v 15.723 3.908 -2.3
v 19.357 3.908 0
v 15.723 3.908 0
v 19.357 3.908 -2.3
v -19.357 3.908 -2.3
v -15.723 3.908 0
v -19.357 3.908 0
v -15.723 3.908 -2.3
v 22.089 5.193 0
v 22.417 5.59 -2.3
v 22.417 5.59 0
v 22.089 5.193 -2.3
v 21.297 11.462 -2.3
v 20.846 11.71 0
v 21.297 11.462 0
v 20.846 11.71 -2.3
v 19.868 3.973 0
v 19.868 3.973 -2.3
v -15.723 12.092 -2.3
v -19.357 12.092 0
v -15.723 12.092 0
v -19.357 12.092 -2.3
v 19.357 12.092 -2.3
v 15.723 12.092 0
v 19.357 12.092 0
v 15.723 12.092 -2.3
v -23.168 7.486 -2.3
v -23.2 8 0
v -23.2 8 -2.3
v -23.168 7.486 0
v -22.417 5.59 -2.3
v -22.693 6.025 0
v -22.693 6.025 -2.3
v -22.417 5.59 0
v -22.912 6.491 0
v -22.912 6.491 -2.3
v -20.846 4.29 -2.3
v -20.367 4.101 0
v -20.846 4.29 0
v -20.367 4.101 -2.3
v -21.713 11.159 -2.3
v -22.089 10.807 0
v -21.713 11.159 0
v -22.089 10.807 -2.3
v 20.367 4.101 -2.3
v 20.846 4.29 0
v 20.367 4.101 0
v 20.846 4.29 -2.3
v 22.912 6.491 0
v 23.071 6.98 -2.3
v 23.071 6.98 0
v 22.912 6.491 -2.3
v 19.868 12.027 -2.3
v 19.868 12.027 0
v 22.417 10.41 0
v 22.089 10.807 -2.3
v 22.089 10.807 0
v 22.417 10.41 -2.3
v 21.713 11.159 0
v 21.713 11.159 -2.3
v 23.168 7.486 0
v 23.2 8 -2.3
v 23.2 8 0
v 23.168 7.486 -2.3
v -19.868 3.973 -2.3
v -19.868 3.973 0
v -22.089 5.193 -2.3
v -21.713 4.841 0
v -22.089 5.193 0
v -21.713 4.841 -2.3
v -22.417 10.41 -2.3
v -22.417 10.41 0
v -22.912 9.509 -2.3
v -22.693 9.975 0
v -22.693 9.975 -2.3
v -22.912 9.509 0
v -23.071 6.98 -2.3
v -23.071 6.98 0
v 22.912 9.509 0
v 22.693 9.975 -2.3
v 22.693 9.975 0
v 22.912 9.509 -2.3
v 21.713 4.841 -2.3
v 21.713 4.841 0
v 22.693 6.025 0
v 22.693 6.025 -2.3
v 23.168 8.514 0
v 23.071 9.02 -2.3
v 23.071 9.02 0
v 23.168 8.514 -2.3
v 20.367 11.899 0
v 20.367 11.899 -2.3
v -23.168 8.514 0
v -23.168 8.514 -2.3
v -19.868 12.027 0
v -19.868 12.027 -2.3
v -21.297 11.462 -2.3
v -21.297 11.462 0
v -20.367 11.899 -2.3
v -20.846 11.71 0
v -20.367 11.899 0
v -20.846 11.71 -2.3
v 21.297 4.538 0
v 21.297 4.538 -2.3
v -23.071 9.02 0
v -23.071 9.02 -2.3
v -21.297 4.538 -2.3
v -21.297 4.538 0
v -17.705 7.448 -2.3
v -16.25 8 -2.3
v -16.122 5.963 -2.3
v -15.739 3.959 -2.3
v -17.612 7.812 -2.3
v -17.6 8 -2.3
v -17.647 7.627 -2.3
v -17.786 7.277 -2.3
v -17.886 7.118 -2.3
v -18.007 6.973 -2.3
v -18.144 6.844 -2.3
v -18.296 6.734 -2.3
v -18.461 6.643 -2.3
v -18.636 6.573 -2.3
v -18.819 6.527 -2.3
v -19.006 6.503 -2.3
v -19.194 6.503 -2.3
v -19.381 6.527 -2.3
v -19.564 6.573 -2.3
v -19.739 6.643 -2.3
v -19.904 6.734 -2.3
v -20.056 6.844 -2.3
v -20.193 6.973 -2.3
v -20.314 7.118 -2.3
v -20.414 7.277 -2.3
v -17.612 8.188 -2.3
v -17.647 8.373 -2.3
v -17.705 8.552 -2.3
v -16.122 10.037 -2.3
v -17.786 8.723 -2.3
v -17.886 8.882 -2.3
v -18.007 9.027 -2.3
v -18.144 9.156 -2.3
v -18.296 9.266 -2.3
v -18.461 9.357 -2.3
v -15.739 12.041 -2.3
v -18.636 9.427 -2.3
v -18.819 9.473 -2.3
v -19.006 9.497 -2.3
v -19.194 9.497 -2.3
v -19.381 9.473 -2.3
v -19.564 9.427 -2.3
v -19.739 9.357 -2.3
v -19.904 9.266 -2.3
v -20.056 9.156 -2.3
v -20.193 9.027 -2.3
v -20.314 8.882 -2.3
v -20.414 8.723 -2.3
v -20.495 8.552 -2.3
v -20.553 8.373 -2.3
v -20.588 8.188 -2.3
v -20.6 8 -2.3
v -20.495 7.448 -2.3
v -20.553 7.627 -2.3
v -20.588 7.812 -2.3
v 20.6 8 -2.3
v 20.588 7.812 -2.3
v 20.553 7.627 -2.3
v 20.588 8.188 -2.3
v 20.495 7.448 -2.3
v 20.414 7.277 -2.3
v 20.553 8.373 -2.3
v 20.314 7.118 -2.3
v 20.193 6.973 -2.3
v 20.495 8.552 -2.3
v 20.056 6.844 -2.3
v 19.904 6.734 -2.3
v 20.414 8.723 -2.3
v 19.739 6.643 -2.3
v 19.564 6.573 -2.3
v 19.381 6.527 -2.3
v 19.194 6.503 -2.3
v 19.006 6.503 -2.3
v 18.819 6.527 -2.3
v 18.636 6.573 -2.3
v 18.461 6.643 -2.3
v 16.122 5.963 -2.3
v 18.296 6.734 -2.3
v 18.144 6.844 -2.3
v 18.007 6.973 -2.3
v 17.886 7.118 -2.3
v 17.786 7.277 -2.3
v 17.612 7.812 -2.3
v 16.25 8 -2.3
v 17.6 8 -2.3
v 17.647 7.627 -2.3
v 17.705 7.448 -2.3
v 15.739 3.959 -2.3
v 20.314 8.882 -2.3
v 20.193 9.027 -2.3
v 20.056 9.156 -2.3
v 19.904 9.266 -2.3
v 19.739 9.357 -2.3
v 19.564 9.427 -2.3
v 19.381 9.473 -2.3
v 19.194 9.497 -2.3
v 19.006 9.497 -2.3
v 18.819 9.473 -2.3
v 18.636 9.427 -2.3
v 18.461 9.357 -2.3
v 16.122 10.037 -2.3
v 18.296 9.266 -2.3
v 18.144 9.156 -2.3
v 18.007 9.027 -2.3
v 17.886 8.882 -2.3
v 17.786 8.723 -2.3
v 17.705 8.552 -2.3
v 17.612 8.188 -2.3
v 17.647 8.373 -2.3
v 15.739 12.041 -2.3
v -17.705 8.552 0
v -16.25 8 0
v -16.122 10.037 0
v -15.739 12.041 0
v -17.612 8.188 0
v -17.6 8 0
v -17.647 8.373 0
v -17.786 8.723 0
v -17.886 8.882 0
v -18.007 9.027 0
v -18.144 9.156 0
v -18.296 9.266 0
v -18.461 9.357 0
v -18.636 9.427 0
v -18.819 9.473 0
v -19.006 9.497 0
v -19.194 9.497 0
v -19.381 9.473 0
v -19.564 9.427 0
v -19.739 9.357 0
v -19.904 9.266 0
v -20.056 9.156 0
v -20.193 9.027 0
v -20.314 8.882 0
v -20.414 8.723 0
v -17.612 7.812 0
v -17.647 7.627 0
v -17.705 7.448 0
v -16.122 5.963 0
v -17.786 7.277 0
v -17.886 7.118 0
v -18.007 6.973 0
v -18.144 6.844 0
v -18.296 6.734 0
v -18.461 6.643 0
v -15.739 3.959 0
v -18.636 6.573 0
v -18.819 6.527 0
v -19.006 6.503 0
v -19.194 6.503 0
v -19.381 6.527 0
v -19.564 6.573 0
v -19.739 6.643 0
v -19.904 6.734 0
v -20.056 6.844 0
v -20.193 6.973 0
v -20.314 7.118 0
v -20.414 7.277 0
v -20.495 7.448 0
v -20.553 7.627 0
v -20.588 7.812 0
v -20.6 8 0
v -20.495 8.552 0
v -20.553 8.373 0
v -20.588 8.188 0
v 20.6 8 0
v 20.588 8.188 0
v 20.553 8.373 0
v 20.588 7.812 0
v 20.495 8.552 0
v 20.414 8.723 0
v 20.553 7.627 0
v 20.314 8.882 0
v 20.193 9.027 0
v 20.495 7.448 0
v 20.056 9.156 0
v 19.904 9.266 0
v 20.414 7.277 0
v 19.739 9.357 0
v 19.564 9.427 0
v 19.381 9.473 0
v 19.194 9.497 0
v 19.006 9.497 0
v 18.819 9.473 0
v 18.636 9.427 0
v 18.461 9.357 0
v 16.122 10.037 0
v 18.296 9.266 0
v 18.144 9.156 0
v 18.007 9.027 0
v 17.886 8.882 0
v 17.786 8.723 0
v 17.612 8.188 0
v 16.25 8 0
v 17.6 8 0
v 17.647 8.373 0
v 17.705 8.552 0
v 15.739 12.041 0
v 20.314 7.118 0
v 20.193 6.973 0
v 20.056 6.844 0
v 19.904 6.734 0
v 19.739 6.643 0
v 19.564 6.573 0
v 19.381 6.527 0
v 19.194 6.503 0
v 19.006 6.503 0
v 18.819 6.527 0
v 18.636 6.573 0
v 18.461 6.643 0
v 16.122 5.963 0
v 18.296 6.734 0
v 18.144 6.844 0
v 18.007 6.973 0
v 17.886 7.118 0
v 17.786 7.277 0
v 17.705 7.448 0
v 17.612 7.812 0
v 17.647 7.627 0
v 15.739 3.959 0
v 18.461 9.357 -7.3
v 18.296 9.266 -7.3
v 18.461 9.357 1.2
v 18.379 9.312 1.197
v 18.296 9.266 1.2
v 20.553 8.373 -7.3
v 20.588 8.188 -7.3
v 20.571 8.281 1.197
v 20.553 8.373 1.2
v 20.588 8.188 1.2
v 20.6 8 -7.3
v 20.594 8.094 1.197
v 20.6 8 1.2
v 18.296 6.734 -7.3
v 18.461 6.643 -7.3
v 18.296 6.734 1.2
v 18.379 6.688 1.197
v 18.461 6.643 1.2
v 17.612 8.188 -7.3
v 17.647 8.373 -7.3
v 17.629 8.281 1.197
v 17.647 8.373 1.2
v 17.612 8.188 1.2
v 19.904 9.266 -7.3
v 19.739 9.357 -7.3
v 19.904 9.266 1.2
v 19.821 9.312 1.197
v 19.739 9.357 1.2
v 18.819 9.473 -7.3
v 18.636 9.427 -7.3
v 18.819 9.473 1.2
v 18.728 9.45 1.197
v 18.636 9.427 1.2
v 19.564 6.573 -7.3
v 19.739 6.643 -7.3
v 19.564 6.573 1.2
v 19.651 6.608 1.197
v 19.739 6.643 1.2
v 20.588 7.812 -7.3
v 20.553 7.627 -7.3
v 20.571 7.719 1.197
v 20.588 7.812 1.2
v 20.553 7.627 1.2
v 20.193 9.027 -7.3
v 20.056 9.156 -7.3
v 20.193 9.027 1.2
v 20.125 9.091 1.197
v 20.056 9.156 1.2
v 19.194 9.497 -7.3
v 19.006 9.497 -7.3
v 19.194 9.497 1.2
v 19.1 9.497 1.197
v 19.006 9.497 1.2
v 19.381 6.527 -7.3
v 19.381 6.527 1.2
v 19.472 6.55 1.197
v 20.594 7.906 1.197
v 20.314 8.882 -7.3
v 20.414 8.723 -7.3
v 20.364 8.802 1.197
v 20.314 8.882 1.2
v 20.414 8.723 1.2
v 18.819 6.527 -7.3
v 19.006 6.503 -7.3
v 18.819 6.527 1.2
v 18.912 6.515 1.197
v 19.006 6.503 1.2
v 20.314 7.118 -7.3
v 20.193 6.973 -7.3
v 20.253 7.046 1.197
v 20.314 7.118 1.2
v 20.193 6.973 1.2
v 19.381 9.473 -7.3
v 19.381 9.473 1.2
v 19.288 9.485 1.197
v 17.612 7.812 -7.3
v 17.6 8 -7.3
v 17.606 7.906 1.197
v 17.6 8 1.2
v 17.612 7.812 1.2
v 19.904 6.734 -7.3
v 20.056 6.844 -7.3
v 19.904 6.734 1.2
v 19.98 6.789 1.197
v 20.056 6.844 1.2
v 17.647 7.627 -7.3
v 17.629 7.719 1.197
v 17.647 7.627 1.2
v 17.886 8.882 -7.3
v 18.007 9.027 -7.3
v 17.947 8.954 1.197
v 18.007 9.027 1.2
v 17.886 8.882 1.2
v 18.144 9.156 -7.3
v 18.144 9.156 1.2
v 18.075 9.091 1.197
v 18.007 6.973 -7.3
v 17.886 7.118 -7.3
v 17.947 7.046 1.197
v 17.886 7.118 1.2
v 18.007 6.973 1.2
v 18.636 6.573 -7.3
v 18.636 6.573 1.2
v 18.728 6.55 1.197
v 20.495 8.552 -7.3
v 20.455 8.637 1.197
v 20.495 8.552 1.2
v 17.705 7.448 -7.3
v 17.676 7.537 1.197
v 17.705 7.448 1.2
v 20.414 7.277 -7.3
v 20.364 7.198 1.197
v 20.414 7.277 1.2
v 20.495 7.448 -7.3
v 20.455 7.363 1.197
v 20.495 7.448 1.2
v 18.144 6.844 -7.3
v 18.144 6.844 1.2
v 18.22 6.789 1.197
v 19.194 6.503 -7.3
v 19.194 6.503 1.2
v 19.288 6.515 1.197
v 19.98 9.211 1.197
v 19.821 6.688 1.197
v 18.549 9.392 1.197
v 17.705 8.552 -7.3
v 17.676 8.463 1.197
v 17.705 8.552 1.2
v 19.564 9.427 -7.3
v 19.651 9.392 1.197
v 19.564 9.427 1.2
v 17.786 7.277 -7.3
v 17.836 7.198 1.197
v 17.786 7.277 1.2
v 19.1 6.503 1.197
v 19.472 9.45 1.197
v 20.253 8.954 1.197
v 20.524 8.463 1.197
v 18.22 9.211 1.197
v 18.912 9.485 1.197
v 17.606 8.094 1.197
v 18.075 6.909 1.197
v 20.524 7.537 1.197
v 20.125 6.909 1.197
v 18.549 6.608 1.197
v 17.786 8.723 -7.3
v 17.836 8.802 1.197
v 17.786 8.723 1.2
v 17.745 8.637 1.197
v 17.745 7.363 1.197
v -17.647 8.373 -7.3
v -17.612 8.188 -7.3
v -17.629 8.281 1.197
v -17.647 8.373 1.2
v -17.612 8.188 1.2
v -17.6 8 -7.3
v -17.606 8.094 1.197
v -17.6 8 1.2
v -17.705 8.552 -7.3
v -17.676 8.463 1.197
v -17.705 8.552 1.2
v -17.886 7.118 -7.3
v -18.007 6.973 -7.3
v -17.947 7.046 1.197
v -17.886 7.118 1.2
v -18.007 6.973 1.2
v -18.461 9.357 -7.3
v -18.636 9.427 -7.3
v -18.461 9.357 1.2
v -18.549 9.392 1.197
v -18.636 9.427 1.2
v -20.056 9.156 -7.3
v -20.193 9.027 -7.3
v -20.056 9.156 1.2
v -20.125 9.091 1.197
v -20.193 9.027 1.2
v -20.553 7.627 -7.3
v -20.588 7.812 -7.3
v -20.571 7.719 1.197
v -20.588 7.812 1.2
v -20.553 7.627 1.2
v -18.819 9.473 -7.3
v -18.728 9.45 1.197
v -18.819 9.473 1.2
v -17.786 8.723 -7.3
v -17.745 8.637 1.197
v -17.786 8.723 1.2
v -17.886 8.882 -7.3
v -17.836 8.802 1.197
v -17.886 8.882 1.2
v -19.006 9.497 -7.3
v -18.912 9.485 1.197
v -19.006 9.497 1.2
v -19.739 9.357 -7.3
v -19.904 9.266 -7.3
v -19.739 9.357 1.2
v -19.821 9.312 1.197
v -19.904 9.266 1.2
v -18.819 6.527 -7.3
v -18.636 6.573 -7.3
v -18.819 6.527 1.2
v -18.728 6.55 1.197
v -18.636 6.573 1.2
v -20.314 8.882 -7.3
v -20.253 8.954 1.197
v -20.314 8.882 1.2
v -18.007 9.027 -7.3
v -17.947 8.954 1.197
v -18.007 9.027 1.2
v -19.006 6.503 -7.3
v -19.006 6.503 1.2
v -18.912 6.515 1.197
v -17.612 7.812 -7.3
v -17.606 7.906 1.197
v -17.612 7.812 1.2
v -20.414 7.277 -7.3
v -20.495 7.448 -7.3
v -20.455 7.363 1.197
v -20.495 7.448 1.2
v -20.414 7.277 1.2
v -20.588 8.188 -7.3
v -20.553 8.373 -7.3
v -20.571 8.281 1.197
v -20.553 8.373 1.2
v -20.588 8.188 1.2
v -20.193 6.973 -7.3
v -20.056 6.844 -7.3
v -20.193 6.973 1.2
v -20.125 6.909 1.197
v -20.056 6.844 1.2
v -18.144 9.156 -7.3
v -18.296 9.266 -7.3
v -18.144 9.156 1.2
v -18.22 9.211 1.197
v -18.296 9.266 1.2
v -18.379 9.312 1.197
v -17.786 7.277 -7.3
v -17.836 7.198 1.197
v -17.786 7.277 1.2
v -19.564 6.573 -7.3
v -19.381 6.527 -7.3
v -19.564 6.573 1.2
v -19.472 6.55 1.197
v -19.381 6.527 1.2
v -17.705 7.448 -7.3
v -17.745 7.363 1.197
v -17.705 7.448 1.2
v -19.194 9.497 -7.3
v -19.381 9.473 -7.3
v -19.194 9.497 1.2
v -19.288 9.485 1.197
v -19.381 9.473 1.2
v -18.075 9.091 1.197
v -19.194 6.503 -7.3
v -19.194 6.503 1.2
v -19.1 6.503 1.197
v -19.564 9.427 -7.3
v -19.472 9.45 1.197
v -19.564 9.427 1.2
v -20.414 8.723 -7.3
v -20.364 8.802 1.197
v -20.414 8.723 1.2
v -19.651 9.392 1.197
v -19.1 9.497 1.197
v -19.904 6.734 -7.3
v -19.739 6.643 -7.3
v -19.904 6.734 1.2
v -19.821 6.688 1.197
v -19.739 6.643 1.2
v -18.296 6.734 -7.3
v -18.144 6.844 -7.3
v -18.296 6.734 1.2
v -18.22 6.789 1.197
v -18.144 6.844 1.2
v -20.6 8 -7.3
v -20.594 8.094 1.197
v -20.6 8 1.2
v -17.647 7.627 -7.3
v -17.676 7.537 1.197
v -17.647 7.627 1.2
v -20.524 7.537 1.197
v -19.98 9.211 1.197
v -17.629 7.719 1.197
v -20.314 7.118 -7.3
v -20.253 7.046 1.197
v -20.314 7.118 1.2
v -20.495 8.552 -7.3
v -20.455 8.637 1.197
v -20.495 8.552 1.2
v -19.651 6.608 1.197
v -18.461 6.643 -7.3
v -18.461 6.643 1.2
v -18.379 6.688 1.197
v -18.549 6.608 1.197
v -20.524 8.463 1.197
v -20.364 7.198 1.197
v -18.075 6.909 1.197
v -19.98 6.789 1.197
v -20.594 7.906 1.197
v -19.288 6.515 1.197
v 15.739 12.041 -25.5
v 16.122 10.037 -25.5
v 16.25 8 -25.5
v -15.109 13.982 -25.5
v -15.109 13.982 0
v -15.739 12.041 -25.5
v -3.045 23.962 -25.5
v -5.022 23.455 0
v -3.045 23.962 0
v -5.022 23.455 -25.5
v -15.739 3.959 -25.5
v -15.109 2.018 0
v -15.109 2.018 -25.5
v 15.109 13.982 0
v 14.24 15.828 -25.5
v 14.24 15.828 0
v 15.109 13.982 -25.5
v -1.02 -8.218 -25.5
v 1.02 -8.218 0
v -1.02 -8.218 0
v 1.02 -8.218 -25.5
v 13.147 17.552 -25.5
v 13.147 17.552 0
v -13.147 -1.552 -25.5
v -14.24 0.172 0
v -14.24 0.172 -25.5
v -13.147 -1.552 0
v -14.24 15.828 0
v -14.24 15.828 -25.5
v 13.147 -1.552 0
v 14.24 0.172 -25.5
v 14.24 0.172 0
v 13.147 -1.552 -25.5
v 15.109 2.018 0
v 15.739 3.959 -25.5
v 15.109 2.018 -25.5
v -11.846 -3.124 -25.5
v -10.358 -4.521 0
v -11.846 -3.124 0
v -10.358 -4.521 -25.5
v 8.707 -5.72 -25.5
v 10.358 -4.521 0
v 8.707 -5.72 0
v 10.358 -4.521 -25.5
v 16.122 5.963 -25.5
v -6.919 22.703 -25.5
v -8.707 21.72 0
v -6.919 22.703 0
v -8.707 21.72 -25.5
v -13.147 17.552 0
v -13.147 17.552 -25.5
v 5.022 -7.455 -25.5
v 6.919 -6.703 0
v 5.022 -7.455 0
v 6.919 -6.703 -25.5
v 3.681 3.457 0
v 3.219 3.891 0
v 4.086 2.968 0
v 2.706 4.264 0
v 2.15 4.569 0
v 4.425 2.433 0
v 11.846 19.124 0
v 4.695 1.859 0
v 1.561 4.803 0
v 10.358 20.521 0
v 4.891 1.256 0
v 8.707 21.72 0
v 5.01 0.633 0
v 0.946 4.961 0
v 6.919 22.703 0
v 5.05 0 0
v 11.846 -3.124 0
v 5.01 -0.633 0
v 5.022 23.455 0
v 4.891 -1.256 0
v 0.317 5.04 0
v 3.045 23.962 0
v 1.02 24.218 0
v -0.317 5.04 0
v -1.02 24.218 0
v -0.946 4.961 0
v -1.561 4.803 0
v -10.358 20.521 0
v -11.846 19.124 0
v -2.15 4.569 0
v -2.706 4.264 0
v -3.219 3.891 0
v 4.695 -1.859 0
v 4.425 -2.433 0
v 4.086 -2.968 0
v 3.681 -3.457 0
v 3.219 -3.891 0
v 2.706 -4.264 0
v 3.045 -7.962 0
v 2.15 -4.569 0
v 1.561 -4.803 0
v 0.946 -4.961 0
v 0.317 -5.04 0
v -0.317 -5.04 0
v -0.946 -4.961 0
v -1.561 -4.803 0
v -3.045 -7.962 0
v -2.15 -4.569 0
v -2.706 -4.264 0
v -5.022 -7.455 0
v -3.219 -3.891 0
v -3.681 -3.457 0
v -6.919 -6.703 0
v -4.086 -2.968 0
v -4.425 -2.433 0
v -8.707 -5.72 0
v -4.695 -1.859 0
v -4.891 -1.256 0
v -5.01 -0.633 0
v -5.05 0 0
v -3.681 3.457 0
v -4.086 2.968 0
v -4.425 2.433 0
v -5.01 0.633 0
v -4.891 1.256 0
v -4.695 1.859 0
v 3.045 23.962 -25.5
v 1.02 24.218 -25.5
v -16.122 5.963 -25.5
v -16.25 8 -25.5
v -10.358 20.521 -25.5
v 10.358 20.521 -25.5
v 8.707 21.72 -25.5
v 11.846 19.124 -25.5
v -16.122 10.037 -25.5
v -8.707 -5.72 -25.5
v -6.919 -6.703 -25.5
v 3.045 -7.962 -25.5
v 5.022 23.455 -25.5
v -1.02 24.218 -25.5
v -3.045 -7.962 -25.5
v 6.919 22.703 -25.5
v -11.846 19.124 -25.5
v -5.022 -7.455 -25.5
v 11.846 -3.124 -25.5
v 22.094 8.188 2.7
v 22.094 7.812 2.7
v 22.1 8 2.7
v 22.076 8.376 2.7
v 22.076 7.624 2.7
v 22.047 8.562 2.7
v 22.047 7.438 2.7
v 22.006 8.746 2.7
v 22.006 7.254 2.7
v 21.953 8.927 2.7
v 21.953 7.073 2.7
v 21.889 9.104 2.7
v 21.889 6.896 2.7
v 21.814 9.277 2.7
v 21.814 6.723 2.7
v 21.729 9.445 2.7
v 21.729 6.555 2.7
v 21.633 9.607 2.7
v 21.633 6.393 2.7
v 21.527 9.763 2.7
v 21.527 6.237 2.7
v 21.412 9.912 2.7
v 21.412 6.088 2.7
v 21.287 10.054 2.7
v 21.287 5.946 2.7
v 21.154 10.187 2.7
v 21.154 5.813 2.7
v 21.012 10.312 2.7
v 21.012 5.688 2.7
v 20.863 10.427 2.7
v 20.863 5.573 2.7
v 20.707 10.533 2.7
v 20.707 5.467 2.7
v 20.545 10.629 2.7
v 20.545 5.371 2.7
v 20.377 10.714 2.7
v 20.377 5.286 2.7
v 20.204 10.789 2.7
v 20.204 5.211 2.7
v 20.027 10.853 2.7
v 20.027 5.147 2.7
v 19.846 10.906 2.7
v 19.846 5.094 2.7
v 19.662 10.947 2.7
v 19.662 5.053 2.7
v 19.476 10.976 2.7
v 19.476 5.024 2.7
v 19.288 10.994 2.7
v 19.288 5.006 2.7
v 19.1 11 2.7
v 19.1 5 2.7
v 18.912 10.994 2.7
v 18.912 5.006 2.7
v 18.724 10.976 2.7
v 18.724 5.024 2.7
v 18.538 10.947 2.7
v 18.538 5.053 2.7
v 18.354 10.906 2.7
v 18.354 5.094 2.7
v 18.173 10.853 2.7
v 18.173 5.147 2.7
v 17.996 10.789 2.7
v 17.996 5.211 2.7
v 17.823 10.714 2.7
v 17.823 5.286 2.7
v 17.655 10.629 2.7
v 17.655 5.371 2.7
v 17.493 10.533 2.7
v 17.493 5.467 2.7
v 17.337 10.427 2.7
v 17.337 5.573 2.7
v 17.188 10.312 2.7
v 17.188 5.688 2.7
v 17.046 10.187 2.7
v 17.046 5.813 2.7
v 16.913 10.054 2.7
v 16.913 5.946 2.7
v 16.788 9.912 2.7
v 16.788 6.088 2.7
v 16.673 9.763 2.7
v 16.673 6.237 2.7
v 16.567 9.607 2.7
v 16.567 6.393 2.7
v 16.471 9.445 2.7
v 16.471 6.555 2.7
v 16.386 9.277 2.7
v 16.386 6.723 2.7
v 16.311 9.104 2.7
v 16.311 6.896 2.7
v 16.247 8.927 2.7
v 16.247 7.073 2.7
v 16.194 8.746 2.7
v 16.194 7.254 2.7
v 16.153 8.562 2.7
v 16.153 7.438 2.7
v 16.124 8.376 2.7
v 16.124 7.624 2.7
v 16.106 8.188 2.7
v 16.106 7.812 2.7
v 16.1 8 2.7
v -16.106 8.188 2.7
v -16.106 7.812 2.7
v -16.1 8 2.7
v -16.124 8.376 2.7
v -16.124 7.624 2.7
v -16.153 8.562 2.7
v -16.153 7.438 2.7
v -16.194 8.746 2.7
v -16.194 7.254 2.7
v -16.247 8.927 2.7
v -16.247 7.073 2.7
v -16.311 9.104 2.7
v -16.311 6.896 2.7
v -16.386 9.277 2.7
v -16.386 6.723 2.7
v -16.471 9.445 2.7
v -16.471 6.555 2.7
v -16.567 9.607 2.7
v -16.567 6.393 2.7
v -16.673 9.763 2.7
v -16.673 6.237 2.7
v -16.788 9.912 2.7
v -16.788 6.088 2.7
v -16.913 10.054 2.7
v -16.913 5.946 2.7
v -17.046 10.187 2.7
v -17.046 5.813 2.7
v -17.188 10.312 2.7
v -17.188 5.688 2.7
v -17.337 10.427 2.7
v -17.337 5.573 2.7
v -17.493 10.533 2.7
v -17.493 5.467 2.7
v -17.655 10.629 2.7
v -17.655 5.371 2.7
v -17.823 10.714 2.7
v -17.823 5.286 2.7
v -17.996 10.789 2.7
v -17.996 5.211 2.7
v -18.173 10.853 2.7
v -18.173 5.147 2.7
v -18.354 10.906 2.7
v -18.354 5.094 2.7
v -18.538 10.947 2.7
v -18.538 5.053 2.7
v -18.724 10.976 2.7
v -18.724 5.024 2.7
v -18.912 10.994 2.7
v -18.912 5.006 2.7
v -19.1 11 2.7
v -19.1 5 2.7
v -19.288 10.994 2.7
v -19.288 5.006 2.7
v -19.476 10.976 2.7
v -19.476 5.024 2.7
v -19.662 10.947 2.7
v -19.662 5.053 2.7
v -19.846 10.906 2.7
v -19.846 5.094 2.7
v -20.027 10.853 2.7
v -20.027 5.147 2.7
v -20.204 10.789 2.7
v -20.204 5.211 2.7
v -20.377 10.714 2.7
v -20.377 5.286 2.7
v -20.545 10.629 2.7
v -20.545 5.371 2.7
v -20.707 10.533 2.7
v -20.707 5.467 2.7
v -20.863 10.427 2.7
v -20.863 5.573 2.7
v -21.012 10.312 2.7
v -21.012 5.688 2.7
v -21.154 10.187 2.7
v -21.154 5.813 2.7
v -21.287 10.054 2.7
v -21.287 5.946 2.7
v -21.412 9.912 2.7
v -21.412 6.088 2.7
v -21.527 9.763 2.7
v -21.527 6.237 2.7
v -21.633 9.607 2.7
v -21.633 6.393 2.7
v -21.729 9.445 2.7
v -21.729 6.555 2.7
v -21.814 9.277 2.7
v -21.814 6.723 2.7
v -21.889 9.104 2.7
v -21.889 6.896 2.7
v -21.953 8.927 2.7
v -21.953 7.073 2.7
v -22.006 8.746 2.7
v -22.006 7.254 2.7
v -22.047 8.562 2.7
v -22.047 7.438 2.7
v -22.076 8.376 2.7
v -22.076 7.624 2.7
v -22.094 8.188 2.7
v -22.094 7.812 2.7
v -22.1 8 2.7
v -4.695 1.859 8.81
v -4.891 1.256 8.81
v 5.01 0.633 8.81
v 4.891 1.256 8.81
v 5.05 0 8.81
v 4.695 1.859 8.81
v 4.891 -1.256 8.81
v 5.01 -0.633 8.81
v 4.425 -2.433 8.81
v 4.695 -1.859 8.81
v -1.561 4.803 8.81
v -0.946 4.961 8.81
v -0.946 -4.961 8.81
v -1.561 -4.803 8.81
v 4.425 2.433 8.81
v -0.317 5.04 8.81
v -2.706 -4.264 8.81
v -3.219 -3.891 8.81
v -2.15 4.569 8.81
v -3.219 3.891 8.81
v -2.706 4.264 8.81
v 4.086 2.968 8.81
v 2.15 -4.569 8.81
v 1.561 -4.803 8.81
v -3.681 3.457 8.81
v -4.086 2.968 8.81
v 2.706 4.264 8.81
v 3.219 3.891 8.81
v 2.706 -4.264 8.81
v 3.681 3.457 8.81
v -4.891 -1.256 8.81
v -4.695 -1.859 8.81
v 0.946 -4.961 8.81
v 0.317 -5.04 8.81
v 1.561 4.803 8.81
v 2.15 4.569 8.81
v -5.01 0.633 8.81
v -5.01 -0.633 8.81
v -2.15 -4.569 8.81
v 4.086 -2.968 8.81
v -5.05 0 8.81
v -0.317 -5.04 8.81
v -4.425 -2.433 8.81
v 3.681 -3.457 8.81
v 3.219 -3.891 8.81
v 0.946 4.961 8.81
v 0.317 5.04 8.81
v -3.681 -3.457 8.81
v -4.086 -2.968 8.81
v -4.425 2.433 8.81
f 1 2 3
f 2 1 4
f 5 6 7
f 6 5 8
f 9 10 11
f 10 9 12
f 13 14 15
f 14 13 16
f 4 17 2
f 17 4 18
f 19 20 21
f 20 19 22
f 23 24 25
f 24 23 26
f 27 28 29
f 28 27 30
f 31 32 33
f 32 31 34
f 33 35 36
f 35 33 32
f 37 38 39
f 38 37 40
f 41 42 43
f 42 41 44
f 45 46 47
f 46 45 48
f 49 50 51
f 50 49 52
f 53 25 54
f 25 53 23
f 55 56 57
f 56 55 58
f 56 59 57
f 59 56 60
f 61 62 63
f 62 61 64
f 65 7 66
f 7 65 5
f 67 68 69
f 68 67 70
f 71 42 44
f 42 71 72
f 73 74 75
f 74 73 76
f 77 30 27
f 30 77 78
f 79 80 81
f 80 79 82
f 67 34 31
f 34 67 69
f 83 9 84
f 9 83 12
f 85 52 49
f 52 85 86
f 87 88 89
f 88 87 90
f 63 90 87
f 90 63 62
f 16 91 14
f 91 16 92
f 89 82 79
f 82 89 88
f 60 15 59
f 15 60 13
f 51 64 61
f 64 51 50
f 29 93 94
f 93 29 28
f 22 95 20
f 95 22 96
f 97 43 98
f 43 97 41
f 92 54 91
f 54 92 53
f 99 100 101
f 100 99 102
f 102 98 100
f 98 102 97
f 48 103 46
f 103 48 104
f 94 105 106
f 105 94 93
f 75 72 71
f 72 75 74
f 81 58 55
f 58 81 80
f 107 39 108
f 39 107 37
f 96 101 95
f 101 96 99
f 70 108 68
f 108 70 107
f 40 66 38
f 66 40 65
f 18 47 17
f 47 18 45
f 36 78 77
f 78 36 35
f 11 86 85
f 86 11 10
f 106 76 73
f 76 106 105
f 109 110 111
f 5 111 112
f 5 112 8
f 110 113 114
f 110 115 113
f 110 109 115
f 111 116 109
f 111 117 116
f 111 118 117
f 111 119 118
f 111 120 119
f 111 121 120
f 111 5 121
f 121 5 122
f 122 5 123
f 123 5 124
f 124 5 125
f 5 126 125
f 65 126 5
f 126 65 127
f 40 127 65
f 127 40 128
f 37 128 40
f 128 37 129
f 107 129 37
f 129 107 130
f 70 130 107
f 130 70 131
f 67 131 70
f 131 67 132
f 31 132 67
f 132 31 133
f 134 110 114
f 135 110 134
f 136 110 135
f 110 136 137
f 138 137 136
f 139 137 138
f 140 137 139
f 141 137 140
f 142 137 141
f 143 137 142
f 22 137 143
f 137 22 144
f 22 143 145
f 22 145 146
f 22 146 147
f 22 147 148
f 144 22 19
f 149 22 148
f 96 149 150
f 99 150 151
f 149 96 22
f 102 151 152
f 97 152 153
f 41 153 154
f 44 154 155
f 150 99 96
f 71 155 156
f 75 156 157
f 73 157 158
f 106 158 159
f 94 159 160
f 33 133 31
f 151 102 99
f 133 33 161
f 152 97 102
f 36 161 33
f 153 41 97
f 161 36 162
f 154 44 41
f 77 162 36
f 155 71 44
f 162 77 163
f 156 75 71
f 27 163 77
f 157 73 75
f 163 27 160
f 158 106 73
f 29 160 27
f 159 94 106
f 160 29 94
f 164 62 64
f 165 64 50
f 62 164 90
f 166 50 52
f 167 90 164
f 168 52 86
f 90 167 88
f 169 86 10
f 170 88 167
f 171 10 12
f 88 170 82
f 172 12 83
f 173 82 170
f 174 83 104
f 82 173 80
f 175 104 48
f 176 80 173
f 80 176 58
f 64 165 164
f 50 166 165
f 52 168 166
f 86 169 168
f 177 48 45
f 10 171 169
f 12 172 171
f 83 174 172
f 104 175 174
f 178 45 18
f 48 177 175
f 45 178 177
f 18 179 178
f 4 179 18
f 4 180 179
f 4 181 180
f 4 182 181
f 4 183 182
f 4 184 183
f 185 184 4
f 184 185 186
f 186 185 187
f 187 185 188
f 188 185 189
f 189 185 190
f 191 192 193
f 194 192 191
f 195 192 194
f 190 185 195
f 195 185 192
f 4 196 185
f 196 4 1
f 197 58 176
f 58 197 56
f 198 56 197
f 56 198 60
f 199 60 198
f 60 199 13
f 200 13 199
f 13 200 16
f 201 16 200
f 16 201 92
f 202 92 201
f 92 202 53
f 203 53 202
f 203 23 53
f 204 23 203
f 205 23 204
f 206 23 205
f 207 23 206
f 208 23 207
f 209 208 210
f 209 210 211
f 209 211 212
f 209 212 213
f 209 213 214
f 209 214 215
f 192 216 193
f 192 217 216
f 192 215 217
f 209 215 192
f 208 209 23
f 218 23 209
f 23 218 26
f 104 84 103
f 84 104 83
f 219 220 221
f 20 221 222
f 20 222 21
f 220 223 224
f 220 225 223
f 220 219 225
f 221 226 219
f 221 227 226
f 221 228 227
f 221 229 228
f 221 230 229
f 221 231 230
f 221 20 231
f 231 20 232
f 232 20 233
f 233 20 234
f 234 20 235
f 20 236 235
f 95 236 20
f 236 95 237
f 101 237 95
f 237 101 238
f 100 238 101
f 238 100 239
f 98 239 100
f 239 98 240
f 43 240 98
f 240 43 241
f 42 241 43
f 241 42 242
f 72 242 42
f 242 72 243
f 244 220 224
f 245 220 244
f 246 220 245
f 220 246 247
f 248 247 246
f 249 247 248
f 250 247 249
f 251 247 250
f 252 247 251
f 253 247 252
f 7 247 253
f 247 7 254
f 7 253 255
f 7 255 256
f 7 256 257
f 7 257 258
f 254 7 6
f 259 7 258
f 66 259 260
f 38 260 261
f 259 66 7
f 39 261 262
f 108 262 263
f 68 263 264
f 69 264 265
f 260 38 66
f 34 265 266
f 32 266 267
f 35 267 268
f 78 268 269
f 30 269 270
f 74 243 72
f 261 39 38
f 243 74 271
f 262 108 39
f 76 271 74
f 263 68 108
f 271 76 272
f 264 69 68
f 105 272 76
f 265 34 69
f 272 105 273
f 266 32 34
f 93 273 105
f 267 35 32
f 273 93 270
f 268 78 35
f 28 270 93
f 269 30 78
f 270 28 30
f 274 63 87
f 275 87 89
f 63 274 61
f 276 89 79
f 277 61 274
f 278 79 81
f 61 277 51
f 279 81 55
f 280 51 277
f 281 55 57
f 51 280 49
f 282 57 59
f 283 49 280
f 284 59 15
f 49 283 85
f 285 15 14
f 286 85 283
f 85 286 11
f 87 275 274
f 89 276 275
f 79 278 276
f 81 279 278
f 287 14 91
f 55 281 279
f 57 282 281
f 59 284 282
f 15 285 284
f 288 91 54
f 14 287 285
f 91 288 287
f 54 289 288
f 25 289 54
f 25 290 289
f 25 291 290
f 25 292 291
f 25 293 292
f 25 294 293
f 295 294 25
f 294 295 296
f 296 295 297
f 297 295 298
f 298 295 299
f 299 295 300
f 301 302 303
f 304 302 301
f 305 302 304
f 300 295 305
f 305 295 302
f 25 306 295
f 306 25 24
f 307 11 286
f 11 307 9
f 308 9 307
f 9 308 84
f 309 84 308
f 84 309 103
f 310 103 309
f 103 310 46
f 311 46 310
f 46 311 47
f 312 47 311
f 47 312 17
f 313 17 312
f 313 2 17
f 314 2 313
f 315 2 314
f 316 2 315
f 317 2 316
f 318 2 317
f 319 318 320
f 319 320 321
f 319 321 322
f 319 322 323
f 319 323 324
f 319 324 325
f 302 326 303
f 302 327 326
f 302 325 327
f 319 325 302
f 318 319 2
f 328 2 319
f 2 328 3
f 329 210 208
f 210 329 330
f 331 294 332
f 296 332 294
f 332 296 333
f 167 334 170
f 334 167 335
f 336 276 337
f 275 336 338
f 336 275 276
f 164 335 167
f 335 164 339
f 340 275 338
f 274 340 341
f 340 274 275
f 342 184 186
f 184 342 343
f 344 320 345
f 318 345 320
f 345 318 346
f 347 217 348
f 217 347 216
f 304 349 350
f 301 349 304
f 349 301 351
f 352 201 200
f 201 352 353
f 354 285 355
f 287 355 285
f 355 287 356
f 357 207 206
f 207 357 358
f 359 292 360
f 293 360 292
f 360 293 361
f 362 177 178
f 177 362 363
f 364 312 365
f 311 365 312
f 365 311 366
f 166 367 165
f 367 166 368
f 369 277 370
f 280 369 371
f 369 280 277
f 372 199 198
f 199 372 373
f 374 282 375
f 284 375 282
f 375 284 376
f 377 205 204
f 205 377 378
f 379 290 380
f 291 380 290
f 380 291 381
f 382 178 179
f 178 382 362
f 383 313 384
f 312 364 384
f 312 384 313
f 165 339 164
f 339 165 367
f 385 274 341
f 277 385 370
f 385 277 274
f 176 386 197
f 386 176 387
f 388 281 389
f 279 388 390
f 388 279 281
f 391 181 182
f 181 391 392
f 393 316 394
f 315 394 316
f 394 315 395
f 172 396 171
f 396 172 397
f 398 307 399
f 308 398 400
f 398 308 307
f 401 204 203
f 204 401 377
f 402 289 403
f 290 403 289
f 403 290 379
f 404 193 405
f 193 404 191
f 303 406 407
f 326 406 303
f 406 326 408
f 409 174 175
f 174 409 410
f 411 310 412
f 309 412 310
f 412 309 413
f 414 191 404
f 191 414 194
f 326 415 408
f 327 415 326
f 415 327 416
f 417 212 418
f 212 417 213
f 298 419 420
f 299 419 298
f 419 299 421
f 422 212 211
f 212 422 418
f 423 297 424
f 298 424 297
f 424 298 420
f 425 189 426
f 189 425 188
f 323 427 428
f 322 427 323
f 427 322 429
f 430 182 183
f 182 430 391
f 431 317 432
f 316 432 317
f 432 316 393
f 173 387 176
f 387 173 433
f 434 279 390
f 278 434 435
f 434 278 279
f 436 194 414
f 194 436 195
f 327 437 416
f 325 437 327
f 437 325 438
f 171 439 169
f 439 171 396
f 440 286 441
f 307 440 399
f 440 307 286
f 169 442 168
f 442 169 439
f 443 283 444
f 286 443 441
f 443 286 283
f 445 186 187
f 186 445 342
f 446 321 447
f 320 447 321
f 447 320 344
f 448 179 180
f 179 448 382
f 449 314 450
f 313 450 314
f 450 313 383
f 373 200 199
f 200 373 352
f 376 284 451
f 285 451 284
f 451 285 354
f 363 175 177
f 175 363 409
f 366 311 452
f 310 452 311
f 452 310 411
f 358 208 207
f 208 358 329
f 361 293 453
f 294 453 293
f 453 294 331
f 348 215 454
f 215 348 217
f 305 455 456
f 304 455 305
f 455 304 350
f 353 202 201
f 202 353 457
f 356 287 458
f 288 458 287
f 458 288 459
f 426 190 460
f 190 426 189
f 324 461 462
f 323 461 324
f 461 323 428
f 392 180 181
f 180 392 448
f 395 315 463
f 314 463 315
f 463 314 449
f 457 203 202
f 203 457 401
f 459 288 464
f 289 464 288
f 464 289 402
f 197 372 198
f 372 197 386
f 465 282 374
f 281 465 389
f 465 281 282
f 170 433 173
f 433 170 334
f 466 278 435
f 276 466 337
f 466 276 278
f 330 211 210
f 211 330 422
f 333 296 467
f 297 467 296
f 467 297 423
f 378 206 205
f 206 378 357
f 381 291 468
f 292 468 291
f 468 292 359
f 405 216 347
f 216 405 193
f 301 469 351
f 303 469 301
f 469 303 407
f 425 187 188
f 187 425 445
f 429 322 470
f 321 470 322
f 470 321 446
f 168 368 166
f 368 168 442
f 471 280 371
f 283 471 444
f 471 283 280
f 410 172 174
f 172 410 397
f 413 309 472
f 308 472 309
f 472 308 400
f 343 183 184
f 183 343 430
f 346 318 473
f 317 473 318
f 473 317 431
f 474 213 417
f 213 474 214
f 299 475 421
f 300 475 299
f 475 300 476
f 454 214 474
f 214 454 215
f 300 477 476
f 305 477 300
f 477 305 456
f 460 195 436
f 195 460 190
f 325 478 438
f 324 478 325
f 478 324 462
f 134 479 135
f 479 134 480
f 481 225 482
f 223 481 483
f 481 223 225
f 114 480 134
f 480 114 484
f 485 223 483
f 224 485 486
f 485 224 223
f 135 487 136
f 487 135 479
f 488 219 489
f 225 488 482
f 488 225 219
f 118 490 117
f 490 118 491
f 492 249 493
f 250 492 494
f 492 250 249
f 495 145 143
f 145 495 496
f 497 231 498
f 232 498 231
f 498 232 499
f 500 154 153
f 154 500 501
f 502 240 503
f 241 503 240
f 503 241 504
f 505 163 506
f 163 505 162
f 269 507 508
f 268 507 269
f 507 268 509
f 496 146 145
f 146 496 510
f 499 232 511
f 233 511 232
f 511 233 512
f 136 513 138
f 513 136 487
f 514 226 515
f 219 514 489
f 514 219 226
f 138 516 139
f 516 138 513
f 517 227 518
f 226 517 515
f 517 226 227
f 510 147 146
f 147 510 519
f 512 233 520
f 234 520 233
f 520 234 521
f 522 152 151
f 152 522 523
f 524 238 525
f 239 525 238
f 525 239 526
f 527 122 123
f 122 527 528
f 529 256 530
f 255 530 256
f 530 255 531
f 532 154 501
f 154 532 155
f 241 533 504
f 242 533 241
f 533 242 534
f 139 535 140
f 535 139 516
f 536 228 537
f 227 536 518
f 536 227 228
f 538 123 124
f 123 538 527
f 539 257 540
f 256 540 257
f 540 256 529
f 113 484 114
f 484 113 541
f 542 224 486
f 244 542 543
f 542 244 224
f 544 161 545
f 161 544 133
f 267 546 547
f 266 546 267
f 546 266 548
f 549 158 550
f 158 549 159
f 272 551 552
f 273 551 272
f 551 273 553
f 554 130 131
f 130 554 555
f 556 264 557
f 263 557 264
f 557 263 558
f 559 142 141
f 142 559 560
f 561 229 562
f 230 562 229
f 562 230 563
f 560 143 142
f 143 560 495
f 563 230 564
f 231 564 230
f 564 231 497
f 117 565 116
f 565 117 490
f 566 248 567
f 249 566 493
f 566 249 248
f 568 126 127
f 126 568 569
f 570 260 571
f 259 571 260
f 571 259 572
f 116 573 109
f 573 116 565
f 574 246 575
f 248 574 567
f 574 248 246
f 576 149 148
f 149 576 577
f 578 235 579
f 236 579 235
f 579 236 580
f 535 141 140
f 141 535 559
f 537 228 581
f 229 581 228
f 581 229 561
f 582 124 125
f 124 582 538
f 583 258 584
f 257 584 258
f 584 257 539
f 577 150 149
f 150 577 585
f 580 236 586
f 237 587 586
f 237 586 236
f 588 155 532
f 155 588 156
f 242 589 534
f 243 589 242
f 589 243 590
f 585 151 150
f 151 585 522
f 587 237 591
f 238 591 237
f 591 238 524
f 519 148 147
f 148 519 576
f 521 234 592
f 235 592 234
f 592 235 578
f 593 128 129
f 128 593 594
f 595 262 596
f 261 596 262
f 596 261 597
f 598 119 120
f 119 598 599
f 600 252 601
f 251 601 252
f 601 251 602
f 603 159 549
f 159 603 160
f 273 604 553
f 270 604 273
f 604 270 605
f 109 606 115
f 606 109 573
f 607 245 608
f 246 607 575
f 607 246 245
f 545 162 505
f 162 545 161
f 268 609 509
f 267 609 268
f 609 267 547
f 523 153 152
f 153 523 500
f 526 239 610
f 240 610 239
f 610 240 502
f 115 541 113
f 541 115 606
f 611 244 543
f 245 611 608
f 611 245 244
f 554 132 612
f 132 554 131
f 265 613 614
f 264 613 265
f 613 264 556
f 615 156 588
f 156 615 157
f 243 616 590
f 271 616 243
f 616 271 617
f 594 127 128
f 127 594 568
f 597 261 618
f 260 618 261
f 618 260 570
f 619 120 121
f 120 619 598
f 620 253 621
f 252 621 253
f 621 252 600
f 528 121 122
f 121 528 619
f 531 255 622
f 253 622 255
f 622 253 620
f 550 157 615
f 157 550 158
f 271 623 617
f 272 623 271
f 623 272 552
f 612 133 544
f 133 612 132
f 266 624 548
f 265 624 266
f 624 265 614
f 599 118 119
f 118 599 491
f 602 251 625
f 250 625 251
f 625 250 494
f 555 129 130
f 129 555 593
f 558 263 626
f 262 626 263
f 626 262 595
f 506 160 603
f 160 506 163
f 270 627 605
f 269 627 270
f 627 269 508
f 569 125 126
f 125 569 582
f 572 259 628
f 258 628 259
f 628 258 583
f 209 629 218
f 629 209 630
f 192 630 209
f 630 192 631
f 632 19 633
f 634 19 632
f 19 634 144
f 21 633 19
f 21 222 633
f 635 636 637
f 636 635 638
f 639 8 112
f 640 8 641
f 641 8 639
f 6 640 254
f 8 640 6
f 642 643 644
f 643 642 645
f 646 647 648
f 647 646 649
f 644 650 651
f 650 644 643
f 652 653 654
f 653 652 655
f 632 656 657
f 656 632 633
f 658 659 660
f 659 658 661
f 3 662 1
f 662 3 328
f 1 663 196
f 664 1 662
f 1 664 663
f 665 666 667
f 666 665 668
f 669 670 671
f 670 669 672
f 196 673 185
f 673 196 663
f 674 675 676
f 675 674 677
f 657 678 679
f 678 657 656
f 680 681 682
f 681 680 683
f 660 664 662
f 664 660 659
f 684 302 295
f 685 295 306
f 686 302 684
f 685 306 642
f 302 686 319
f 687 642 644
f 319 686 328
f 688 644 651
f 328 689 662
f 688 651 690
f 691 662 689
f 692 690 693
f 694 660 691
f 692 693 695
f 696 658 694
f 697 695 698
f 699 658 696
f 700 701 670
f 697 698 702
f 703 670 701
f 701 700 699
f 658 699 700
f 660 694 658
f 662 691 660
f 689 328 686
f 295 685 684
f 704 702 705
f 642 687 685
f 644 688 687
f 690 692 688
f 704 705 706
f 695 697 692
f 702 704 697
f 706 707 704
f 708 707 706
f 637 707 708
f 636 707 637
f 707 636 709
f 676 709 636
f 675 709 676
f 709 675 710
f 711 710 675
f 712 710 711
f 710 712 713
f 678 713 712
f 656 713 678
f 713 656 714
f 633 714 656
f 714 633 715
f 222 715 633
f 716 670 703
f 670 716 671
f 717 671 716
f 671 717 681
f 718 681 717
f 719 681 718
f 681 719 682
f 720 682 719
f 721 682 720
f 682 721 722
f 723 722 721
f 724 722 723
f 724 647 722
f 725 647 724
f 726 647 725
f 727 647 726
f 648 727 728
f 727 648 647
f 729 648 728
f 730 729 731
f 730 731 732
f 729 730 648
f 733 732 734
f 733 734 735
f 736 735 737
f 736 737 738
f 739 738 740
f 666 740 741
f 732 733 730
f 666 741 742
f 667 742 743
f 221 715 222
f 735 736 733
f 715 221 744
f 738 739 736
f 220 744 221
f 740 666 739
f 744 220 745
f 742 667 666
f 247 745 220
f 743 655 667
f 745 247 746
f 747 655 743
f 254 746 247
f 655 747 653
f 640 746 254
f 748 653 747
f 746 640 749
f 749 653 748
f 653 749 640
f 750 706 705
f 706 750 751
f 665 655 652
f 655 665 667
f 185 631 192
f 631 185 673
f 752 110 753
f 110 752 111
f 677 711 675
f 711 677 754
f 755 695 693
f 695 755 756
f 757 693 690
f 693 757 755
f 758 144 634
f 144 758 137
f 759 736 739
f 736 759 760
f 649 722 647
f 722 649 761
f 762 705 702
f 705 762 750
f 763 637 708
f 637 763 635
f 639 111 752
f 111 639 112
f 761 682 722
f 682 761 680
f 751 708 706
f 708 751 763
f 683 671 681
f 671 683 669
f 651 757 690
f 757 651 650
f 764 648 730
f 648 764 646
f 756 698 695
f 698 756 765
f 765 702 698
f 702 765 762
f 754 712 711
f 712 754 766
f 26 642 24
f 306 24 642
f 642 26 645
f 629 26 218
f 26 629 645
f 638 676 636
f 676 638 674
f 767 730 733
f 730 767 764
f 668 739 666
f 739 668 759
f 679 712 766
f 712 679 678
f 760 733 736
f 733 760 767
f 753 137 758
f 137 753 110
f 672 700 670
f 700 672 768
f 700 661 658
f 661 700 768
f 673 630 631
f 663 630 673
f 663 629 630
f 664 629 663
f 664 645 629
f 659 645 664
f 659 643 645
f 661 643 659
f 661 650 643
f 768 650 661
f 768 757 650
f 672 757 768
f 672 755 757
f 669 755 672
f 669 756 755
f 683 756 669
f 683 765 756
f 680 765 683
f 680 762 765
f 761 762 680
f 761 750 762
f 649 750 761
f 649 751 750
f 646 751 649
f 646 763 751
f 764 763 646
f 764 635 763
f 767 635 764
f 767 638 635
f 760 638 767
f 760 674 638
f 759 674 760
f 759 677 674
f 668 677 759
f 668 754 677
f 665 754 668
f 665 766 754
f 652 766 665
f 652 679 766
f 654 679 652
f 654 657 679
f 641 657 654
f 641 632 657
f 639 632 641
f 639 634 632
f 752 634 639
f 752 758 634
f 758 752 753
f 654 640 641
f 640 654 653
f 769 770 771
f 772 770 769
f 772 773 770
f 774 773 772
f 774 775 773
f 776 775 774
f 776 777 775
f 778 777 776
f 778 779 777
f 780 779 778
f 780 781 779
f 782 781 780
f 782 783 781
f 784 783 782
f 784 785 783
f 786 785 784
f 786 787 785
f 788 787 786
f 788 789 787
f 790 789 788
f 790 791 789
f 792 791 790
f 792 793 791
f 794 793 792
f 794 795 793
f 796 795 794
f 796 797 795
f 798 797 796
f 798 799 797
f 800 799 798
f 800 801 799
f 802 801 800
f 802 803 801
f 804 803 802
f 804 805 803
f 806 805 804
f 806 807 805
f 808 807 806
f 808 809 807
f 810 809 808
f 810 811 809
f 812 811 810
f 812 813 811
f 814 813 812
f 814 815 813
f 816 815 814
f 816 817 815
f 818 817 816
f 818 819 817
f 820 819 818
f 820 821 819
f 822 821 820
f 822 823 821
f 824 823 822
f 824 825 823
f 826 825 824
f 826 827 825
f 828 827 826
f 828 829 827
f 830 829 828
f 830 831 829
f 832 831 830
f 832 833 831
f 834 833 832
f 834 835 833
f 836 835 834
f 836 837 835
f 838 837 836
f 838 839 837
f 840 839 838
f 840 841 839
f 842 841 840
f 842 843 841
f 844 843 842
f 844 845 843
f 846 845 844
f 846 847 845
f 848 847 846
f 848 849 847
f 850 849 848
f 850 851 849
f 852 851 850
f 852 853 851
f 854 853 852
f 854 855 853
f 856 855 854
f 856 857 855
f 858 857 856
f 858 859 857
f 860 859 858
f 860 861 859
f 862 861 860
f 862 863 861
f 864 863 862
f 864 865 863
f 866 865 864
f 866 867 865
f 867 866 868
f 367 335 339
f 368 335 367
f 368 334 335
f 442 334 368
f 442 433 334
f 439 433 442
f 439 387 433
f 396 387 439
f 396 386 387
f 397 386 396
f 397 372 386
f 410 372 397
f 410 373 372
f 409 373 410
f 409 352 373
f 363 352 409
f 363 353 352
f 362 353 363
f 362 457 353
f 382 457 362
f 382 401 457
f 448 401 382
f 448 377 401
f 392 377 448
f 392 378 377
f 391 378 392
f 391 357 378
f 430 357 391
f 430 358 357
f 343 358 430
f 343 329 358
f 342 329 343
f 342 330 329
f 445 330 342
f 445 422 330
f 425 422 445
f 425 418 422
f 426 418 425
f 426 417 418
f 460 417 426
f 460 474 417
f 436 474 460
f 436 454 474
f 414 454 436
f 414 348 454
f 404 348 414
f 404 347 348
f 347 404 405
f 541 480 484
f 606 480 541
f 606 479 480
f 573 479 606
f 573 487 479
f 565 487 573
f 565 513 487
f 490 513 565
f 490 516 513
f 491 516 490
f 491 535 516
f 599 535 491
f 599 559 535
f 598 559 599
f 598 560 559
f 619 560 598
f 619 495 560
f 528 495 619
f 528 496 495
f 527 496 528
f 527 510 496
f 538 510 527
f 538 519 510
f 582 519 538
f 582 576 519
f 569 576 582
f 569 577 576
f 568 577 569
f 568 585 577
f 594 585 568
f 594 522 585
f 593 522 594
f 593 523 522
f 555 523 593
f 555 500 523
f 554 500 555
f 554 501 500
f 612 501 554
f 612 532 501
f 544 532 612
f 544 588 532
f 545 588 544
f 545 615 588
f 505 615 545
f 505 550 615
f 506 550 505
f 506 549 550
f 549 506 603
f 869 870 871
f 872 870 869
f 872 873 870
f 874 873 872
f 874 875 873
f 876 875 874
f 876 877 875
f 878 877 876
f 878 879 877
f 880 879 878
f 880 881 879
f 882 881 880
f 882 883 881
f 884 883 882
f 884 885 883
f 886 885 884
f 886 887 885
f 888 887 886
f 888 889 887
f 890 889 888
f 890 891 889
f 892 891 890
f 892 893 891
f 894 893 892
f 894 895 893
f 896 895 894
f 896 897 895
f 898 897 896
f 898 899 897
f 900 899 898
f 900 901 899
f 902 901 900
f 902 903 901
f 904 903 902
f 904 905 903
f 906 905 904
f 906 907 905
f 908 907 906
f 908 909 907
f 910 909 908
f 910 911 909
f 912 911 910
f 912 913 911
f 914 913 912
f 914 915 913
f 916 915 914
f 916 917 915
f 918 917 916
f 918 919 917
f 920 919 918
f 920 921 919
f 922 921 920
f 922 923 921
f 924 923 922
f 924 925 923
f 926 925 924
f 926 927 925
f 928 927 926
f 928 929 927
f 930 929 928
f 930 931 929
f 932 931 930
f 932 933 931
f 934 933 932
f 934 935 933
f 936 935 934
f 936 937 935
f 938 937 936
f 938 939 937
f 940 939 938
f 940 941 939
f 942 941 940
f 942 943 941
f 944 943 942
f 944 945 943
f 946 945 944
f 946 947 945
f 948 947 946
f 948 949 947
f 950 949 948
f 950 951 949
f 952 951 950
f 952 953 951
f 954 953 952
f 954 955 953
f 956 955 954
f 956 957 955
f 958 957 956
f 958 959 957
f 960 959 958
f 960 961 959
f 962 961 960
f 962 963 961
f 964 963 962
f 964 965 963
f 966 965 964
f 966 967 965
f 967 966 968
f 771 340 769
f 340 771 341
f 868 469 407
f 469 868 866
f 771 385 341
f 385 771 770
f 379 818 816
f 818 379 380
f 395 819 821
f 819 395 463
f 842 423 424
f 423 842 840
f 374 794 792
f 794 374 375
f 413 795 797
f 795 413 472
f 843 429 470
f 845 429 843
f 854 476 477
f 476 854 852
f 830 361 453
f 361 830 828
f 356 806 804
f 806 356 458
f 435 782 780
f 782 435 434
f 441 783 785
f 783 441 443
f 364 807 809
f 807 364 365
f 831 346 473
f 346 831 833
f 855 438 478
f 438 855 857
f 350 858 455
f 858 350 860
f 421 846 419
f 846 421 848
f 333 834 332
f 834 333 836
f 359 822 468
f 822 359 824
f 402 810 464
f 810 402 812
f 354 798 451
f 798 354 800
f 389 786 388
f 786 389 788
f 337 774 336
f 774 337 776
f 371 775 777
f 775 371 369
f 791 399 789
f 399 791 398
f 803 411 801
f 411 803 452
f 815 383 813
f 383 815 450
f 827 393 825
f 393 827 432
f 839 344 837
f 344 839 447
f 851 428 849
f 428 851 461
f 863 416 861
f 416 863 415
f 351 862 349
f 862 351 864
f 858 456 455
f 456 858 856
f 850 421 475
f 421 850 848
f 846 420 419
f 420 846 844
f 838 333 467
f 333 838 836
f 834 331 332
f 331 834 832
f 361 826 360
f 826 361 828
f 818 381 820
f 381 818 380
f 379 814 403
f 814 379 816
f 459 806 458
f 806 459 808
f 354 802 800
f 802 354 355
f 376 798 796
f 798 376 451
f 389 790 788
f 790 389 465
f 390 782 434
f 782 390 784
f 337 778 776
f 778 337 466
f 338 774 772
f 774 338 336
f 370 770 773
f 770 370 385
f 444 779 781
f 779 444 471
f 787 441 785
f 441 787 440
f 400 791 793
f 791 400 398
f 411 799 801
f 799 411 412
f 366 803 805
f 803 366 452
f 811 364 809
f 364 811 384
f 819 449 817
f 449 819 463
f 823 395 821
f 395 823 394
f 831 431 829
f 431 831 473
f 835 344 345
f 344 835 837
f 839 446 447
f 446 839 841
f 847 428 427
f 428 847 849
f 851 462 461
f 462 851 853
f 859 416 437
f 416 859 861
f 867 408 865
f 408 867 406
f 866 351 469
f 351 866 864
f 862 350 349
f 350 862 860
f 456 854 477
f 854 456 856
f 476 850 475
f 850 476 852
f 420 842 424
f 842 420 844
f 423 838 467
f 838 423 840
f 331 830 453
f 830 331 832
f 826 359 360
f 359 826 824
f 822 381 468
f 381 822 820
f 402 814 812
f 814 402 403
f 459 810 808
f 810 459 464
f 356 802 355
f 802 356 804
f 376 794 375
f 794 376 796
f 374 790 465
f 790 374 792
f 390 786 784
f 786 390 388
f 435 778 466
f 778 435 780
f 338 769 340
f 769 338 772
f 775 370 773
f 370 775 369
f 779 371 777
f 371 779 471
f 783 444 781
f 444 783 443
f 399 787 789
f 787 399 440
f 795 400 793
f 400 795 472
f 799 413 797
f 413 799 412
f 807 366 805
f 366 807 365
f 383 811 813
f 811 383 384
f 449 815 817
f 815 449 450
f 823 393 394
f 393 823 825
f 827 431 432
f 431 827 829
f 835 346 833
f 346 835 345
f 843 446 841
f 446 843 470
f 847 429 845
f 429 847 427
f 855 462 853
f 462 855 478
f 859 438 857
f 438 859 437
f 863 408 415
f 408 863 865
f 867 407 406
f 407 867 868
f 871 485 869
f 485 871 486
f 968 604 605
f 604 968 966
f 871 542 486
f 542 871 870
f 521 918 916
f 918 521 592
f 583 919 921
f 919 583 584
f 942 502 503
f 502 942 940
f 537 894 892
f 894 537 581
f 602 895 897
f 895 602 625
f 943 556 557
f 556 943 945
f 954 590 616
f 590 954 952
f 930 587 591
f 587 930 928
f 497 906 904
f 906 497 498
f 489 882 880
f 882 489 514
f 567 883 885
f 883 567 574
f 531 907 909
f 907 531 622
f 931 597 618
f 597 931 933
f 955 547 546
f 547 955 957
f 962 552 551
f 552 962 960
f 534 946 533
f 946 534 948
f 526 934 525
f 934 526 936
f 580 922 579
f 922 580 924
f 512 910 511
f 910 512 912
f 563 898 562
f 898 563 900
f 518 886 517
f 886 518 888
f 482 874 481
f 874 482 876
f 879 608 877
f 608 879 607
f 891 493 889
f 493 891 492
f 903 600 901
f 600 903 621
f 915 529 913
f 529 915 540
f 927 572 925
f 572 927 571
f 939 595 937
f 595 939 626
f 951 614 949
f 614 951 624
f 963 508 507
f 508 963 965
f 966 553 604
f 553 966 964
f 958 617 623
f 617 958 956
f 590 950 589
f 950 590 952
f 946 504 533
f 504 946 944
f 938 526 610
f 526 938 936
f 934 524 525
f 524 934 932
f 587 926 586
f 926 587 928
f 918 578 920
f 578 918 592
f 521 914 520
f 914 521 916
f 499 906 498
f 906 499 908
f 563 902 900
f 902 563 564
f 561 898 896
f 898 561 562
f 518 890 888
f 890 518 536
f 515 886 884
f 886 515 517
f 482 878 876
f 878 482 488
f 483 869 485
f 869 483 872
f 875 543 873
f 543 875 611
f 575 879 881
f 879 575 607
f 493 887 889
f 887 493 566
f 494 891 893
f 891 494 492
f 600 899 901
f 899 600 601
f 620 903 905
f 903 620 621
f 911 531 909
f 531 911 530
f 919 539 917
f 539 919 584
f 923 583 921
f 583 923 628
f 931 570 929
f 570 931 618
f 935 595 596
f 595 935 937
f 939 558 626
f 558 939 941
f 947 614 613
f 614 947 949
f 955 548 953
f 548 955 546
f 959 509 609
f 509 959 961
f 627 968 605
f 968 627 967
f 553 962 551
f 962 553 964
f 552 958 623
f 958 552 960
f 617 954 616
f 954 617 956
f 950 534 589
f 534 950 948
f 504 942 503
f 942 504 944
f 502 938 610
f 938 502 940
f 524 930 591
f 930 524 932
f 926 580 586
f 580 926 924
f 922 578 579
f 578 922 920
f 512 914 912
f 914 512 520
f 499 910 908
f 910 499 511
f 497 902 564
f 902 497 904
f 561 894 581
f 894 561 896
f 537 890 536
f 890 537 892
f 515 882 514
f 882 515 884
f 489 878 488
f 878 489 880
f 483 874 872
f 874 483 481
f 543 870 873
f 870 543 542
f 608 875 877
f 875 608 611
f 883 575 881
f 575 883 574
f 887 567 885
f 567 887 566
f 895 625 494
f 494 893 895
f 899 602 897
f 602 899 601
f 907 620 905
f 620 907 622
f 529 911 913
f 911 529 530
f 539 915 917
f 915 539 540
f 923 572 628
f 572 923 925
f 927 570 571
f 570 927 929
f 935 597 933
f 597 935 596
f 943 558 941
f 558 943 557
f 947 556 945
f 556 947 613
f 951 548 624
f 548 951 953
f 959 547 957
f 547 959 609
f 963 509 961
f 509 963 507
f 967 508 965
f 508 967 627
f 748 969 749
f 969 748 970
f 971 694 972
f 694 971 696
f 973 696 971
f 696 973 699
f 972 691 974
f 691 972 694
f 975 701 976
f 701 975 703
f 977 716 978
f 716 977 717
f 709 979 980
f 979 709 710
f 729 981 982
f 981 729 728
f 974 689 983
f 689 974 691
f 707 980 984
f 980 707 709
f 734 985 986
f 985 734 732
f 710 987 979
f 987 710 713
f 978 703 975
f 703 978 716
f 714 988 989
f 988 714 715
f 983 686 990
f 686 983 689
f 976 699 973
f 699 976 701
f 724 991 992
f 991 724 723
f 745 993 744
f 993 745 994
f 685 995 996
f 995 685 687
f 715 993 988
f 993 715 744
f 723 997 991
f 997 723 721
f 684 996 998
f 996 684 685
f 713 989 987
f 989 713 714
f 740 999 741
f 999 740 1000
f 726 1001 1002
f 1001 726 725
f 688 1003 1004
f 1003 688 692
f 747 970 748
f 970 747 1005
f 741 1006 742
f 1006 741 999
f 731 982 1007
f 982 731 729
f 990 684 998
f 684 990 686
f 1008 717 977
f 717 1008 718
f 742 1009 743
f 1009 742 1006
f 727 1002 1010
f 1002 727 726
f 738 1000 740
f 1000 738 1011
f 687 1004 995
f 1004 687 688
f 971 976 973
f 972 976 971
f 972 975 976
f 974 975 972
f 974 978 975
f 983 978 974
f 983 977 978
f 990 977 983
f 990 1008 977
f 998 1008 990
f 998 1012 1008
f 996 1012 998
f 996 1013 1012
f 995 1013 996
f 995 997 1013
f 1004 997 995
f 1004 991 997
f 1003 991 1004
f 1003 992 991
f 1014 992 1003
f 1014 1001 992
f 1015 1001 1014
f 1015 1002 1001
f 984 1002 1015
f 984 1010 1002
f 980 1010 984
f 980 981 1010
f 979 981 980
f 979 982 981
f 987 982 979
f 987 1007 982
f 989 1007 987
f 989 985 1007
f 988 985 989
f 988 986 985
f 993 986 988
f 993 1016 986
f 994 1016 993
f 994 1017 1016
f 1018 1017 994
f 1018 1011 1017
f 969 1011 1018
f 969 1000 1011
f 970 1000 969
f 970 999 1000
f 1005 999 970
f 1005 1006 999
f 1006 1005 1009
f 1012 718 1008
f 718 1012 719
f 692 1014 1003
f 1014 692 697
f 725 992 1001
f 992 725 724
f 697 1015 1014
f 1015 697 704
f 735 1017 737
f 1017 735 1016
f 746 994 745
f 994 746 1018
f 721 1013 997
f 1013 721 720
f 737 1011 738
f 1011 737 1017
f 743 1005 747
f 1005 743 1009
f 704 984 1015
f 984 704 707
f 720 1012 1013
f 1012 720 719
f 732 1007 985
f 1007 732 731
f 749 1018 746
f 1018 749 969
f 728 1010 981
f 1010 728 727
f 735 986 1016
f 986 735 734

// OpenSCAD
module motor() {
    $fn=50;
    translate([0, 8, -25.5])
    union() {
        cylinder(d=32.5, h=25.5);
        translate([0, -8, 0.01]) cylinder(d=10, h=34.2-7.33-0.8);
        color(c=[.7,.7,.7]) translate([0, -8, 0.01]) cylinder(d=5, h=34.2);
        color(c=[.7,.7,.7]) translate([0, -8, 0.01]) cylinder(d=8, h=34.2-7.33);
        translate([0, 0, 23.2])
        difference(){
            hull(){
                translate([38.2/2, 0, 0]) cylinder(d=8.2,h=2.3);
                translate([-38.2/2, 0, 0]) cylinder(d=8.2,h=2.3);
            }
            translate([38.2/2, 0, 0]) cylinder(d=3,h=5, center=true);
            translate([-38.2/2, 0, 0]) cylinder(d=3,h=5, center=true);
        };
    };
};

module motor_mount_holes() {
    $fn=50;
    translate([0, 8, -25.5])
    union() {
        translate([0, -8, 0.01]) cylinder(d=10.1, h=34.3);
        translate([0, 0, 23.2])
        union() {
            //отверстия
            translate([38.2/2, 0, 0])  cylinder(d=3,h=10, center=true);
            translate([-38.2/2, 0, 0]) cylinder(d=3,h=10, center=true);
            //фаски            
            translate([38.2/2, 0,2])  cylinder(d1=0, d2=6,h=3, $fn=100);
            translate([-38.2/2, 0,2])  cylinder(d1=0, d2=6,h=3, $fn=100);
        };
    };
};

motor();
#motor_mount_holes();
